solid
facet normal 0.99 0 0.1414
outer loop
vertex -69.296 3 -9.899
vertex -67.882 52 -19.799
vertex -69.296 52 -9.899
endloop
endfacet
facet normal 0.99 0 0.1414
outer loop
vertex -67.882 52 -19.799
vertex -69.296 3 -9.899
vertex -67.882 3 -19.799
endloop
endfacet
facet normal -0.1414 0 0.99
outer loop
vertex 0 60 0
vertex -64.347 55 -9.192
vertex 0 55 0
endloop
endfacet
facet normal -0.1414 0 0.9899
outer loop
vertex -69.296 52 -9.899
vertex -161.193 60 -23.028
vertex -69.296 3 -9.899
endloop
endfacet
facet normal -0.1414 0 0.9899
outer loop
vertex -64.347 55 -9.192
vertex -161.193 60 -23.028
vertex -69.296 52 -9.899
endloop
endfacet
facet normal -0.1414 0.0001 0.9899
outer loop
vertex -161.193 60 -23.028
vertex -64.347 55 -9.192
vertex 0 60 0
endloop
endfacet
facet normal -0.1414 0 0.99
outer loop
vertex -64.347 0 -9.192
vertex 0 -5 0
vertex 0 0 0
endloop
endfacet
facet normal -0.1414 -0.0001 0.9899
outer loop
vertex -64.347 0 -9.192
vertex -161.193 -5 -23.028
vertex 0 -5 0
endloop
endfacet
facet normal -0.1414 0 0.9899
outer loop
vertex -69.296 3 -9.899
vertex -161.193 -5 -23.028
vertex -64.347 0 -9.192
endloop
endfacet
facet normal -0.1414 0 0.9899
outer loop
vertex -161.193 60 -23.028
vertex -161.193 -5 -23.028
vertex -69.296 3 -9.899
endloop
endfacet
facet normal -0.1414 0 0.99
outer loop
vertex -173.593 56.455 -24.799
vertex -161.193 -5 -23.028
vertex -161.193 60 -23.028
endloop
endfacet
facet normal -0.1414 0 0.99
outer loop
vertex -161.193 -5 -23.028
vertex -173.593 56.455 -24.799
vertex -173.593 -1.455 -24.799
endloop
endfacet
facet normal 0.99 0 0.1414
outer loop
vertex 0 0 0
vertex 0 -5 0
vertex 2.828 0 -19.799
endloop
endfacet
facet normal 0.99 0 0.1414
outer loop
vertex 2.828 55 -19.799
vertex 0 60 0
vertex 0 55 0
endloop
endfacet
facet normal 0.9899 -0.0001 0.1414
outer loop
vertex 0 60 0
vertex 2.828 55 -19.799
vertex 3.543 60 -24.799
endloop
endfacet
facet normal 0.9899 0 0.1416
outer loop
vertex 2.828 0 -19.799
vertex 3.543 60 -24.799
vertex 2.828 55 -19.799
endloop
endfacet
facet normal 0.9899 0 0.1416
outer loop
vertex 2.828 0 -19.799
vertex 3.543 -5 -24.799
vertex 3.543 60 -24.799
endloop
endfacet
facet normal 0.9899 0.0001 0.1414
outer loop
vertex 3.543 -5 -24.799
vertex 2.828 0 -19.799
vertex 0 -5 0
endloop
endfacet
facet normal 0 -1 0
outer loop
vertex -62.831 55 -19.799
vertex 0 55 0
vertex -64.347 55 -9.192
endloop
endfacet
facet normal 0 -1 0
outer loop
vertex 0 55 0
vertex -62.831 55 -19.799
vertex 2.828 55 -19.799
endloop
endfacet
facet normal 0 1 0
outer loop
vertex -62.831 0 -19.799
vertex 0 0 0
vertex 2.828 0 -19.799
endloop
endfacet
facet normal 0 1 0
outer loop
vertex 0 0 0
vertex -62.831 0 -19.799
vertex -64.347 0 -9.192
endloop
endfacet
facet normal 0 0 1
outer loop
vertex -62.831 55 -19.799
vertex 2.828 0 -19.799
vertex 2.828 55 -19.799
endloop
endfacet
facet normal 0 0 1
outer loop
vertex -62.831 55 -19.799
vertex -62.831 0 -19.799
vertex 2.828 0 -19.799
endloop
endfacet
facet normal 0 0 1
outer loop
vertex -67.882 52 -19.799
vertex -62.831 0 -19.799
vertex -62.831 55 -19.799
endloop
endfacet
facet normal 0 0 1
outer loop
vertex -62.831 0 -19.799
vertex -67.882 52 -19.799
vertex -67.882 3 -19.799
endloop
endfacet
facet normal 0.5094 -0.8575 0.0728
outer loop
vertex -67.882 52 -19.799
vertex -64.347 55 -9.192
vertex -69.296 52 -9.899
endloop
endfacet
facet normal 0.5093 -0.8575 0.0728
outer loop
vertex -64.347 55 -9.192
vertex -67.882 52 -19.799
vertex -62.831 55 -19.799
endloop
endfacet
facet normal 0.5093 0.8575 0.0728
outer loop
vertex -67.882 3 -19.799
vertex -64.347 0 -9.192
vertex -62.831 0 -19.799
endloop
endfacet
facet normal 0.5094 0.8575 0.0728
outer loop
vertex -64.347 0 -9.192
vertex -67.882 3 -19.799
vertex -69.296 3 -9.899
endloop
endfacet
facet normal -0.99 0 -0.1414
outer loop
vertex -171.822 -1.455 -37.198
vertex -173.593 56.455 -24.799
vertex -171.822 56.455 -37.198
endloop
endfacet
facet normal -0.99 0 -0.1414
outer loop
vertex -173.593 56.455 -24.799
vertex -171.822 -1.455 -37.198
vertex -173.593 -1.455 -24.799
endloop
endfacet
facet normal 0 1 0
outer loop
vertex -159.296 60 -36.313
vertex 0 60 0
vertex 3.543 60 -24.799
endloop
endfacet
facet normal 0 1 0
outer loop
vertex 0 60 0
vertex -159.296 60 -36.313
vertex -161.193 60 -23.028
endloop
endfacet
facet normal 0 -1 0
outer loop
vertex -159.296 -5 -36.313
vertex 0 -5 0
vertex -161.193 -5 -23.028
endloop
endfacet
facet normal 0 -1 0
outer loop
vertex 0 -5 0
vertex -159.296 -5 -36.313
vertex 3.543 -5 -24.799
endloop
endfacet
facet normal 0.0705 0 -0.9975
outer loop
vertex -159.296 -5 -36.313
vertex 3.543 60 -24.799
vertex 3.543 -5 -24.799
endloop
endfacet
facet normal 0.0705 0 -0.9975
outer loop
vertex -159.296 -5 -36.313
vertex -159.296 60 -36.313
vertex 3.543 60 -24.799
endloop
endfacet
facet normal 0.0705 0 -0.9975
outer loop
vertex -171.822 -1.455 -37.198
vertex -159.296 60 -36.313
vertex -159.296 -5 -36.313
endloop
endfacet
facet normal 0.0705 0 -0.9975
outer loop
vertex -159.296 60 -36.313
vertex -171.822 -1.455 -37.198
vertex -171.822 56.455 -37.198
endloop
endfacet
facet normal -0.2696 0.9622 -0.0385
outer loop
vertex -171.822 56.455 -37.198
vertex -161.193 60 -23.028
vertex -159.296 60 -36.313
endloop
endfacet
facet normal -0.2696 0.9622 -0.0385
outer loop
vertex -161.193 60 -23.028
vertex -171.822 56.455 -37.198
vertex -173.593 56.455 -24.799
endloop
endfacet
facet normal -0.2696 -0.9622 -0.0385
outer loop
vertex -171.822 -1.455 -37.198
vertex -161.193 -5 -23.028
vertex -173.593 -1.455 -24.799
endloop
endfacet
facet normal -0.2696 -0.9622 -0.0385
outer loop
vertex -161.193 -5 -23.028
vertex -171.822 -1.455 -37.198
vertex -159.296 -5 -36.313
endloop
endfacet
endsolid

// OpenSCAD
bar_width = 70;
bar_depth = 55;
bar_cut_corner_width = 5;
bar_cut_corner_depth = 3;
bar_thickness = 10;
bar_height = 10;
thickness = 5;

module base_polygon(extra_width=0) {
    polygon([
        [0, 0],
        [bar_width + extra_width - bar_cut_corner_width, 0],
        [bar_width + extra_width , bar_cut_corner_depth],
        [bar_width + extra_width , bar_depth - bar_cut_corner_depth],
        [bar_width + extra_width - bar_cut_corner_width, bar_depth],
        [0, bar_depth]
    ]);
}

module base_hull(extra_depth=0, extra_width=0) {
    translate([-extra_width, 0, -extra_depth])
    intersection() {
        linear_extrude(bar_height + bar_thickness + extra_depth + extra_width * (bar_height + bar_thickness)/ bar_width){
            base_polygon(extra_width);
        }
        union() {
            cube([bar_width + extra_width, bar_depth, bar_thickness+extra_depth]);
            translate([0, bar_depth, bar_thickness+ extra_depth]) rotate([90, 0, 0]) {
                linear_extrude(bar_depth) {
                    polygon([
                        [0, 0],
                        [0, (bar_height) * (bar_width + extra_width) / bar_width],
                        [bar_width + extra_width, 0],
                    ]);
                }
            }
        }
    }
}

if (true) {
    bar_hypotenuse = sqrt(bar_height * bar_height + bar_width * bar_width);
    thickness_on_height = bar_hypotenuse * thickness / bar_width;
    thickness_on_width = bar_width * (bar_height + bar_thickness + thickness_on_height) / bar_height;
    echo(bar_hypotenuse);
    echo(thickness_on_height);
    echo(thickness_on_width);
rotate([0, 180-atan((bar_height)/( bar_width)), 0])
difference() {
    translate([0, -thickness, 0]) {
        resize([
                thickness_on_width,
                bar_depth + 2*thickness,
                bar_height + bar_thickness + thickness_on_height
            ]) {
            base_hull();
        }
    } //*/
    base_hull(0, 0);
    /*translate([-1, bar_depth + 2*thickness, -1]) rotate([90, 0, 0]) {
        linear_extrude(bar_depth + 4*thickness) {
            polygon([
                [0, 0],
                [0, bar_width + bar_depth],
                [bar_width + bar_depth, bar_width + bar_depth]
            ]);
        }
    }//*/
}
}

//base_hull(10, 50);
